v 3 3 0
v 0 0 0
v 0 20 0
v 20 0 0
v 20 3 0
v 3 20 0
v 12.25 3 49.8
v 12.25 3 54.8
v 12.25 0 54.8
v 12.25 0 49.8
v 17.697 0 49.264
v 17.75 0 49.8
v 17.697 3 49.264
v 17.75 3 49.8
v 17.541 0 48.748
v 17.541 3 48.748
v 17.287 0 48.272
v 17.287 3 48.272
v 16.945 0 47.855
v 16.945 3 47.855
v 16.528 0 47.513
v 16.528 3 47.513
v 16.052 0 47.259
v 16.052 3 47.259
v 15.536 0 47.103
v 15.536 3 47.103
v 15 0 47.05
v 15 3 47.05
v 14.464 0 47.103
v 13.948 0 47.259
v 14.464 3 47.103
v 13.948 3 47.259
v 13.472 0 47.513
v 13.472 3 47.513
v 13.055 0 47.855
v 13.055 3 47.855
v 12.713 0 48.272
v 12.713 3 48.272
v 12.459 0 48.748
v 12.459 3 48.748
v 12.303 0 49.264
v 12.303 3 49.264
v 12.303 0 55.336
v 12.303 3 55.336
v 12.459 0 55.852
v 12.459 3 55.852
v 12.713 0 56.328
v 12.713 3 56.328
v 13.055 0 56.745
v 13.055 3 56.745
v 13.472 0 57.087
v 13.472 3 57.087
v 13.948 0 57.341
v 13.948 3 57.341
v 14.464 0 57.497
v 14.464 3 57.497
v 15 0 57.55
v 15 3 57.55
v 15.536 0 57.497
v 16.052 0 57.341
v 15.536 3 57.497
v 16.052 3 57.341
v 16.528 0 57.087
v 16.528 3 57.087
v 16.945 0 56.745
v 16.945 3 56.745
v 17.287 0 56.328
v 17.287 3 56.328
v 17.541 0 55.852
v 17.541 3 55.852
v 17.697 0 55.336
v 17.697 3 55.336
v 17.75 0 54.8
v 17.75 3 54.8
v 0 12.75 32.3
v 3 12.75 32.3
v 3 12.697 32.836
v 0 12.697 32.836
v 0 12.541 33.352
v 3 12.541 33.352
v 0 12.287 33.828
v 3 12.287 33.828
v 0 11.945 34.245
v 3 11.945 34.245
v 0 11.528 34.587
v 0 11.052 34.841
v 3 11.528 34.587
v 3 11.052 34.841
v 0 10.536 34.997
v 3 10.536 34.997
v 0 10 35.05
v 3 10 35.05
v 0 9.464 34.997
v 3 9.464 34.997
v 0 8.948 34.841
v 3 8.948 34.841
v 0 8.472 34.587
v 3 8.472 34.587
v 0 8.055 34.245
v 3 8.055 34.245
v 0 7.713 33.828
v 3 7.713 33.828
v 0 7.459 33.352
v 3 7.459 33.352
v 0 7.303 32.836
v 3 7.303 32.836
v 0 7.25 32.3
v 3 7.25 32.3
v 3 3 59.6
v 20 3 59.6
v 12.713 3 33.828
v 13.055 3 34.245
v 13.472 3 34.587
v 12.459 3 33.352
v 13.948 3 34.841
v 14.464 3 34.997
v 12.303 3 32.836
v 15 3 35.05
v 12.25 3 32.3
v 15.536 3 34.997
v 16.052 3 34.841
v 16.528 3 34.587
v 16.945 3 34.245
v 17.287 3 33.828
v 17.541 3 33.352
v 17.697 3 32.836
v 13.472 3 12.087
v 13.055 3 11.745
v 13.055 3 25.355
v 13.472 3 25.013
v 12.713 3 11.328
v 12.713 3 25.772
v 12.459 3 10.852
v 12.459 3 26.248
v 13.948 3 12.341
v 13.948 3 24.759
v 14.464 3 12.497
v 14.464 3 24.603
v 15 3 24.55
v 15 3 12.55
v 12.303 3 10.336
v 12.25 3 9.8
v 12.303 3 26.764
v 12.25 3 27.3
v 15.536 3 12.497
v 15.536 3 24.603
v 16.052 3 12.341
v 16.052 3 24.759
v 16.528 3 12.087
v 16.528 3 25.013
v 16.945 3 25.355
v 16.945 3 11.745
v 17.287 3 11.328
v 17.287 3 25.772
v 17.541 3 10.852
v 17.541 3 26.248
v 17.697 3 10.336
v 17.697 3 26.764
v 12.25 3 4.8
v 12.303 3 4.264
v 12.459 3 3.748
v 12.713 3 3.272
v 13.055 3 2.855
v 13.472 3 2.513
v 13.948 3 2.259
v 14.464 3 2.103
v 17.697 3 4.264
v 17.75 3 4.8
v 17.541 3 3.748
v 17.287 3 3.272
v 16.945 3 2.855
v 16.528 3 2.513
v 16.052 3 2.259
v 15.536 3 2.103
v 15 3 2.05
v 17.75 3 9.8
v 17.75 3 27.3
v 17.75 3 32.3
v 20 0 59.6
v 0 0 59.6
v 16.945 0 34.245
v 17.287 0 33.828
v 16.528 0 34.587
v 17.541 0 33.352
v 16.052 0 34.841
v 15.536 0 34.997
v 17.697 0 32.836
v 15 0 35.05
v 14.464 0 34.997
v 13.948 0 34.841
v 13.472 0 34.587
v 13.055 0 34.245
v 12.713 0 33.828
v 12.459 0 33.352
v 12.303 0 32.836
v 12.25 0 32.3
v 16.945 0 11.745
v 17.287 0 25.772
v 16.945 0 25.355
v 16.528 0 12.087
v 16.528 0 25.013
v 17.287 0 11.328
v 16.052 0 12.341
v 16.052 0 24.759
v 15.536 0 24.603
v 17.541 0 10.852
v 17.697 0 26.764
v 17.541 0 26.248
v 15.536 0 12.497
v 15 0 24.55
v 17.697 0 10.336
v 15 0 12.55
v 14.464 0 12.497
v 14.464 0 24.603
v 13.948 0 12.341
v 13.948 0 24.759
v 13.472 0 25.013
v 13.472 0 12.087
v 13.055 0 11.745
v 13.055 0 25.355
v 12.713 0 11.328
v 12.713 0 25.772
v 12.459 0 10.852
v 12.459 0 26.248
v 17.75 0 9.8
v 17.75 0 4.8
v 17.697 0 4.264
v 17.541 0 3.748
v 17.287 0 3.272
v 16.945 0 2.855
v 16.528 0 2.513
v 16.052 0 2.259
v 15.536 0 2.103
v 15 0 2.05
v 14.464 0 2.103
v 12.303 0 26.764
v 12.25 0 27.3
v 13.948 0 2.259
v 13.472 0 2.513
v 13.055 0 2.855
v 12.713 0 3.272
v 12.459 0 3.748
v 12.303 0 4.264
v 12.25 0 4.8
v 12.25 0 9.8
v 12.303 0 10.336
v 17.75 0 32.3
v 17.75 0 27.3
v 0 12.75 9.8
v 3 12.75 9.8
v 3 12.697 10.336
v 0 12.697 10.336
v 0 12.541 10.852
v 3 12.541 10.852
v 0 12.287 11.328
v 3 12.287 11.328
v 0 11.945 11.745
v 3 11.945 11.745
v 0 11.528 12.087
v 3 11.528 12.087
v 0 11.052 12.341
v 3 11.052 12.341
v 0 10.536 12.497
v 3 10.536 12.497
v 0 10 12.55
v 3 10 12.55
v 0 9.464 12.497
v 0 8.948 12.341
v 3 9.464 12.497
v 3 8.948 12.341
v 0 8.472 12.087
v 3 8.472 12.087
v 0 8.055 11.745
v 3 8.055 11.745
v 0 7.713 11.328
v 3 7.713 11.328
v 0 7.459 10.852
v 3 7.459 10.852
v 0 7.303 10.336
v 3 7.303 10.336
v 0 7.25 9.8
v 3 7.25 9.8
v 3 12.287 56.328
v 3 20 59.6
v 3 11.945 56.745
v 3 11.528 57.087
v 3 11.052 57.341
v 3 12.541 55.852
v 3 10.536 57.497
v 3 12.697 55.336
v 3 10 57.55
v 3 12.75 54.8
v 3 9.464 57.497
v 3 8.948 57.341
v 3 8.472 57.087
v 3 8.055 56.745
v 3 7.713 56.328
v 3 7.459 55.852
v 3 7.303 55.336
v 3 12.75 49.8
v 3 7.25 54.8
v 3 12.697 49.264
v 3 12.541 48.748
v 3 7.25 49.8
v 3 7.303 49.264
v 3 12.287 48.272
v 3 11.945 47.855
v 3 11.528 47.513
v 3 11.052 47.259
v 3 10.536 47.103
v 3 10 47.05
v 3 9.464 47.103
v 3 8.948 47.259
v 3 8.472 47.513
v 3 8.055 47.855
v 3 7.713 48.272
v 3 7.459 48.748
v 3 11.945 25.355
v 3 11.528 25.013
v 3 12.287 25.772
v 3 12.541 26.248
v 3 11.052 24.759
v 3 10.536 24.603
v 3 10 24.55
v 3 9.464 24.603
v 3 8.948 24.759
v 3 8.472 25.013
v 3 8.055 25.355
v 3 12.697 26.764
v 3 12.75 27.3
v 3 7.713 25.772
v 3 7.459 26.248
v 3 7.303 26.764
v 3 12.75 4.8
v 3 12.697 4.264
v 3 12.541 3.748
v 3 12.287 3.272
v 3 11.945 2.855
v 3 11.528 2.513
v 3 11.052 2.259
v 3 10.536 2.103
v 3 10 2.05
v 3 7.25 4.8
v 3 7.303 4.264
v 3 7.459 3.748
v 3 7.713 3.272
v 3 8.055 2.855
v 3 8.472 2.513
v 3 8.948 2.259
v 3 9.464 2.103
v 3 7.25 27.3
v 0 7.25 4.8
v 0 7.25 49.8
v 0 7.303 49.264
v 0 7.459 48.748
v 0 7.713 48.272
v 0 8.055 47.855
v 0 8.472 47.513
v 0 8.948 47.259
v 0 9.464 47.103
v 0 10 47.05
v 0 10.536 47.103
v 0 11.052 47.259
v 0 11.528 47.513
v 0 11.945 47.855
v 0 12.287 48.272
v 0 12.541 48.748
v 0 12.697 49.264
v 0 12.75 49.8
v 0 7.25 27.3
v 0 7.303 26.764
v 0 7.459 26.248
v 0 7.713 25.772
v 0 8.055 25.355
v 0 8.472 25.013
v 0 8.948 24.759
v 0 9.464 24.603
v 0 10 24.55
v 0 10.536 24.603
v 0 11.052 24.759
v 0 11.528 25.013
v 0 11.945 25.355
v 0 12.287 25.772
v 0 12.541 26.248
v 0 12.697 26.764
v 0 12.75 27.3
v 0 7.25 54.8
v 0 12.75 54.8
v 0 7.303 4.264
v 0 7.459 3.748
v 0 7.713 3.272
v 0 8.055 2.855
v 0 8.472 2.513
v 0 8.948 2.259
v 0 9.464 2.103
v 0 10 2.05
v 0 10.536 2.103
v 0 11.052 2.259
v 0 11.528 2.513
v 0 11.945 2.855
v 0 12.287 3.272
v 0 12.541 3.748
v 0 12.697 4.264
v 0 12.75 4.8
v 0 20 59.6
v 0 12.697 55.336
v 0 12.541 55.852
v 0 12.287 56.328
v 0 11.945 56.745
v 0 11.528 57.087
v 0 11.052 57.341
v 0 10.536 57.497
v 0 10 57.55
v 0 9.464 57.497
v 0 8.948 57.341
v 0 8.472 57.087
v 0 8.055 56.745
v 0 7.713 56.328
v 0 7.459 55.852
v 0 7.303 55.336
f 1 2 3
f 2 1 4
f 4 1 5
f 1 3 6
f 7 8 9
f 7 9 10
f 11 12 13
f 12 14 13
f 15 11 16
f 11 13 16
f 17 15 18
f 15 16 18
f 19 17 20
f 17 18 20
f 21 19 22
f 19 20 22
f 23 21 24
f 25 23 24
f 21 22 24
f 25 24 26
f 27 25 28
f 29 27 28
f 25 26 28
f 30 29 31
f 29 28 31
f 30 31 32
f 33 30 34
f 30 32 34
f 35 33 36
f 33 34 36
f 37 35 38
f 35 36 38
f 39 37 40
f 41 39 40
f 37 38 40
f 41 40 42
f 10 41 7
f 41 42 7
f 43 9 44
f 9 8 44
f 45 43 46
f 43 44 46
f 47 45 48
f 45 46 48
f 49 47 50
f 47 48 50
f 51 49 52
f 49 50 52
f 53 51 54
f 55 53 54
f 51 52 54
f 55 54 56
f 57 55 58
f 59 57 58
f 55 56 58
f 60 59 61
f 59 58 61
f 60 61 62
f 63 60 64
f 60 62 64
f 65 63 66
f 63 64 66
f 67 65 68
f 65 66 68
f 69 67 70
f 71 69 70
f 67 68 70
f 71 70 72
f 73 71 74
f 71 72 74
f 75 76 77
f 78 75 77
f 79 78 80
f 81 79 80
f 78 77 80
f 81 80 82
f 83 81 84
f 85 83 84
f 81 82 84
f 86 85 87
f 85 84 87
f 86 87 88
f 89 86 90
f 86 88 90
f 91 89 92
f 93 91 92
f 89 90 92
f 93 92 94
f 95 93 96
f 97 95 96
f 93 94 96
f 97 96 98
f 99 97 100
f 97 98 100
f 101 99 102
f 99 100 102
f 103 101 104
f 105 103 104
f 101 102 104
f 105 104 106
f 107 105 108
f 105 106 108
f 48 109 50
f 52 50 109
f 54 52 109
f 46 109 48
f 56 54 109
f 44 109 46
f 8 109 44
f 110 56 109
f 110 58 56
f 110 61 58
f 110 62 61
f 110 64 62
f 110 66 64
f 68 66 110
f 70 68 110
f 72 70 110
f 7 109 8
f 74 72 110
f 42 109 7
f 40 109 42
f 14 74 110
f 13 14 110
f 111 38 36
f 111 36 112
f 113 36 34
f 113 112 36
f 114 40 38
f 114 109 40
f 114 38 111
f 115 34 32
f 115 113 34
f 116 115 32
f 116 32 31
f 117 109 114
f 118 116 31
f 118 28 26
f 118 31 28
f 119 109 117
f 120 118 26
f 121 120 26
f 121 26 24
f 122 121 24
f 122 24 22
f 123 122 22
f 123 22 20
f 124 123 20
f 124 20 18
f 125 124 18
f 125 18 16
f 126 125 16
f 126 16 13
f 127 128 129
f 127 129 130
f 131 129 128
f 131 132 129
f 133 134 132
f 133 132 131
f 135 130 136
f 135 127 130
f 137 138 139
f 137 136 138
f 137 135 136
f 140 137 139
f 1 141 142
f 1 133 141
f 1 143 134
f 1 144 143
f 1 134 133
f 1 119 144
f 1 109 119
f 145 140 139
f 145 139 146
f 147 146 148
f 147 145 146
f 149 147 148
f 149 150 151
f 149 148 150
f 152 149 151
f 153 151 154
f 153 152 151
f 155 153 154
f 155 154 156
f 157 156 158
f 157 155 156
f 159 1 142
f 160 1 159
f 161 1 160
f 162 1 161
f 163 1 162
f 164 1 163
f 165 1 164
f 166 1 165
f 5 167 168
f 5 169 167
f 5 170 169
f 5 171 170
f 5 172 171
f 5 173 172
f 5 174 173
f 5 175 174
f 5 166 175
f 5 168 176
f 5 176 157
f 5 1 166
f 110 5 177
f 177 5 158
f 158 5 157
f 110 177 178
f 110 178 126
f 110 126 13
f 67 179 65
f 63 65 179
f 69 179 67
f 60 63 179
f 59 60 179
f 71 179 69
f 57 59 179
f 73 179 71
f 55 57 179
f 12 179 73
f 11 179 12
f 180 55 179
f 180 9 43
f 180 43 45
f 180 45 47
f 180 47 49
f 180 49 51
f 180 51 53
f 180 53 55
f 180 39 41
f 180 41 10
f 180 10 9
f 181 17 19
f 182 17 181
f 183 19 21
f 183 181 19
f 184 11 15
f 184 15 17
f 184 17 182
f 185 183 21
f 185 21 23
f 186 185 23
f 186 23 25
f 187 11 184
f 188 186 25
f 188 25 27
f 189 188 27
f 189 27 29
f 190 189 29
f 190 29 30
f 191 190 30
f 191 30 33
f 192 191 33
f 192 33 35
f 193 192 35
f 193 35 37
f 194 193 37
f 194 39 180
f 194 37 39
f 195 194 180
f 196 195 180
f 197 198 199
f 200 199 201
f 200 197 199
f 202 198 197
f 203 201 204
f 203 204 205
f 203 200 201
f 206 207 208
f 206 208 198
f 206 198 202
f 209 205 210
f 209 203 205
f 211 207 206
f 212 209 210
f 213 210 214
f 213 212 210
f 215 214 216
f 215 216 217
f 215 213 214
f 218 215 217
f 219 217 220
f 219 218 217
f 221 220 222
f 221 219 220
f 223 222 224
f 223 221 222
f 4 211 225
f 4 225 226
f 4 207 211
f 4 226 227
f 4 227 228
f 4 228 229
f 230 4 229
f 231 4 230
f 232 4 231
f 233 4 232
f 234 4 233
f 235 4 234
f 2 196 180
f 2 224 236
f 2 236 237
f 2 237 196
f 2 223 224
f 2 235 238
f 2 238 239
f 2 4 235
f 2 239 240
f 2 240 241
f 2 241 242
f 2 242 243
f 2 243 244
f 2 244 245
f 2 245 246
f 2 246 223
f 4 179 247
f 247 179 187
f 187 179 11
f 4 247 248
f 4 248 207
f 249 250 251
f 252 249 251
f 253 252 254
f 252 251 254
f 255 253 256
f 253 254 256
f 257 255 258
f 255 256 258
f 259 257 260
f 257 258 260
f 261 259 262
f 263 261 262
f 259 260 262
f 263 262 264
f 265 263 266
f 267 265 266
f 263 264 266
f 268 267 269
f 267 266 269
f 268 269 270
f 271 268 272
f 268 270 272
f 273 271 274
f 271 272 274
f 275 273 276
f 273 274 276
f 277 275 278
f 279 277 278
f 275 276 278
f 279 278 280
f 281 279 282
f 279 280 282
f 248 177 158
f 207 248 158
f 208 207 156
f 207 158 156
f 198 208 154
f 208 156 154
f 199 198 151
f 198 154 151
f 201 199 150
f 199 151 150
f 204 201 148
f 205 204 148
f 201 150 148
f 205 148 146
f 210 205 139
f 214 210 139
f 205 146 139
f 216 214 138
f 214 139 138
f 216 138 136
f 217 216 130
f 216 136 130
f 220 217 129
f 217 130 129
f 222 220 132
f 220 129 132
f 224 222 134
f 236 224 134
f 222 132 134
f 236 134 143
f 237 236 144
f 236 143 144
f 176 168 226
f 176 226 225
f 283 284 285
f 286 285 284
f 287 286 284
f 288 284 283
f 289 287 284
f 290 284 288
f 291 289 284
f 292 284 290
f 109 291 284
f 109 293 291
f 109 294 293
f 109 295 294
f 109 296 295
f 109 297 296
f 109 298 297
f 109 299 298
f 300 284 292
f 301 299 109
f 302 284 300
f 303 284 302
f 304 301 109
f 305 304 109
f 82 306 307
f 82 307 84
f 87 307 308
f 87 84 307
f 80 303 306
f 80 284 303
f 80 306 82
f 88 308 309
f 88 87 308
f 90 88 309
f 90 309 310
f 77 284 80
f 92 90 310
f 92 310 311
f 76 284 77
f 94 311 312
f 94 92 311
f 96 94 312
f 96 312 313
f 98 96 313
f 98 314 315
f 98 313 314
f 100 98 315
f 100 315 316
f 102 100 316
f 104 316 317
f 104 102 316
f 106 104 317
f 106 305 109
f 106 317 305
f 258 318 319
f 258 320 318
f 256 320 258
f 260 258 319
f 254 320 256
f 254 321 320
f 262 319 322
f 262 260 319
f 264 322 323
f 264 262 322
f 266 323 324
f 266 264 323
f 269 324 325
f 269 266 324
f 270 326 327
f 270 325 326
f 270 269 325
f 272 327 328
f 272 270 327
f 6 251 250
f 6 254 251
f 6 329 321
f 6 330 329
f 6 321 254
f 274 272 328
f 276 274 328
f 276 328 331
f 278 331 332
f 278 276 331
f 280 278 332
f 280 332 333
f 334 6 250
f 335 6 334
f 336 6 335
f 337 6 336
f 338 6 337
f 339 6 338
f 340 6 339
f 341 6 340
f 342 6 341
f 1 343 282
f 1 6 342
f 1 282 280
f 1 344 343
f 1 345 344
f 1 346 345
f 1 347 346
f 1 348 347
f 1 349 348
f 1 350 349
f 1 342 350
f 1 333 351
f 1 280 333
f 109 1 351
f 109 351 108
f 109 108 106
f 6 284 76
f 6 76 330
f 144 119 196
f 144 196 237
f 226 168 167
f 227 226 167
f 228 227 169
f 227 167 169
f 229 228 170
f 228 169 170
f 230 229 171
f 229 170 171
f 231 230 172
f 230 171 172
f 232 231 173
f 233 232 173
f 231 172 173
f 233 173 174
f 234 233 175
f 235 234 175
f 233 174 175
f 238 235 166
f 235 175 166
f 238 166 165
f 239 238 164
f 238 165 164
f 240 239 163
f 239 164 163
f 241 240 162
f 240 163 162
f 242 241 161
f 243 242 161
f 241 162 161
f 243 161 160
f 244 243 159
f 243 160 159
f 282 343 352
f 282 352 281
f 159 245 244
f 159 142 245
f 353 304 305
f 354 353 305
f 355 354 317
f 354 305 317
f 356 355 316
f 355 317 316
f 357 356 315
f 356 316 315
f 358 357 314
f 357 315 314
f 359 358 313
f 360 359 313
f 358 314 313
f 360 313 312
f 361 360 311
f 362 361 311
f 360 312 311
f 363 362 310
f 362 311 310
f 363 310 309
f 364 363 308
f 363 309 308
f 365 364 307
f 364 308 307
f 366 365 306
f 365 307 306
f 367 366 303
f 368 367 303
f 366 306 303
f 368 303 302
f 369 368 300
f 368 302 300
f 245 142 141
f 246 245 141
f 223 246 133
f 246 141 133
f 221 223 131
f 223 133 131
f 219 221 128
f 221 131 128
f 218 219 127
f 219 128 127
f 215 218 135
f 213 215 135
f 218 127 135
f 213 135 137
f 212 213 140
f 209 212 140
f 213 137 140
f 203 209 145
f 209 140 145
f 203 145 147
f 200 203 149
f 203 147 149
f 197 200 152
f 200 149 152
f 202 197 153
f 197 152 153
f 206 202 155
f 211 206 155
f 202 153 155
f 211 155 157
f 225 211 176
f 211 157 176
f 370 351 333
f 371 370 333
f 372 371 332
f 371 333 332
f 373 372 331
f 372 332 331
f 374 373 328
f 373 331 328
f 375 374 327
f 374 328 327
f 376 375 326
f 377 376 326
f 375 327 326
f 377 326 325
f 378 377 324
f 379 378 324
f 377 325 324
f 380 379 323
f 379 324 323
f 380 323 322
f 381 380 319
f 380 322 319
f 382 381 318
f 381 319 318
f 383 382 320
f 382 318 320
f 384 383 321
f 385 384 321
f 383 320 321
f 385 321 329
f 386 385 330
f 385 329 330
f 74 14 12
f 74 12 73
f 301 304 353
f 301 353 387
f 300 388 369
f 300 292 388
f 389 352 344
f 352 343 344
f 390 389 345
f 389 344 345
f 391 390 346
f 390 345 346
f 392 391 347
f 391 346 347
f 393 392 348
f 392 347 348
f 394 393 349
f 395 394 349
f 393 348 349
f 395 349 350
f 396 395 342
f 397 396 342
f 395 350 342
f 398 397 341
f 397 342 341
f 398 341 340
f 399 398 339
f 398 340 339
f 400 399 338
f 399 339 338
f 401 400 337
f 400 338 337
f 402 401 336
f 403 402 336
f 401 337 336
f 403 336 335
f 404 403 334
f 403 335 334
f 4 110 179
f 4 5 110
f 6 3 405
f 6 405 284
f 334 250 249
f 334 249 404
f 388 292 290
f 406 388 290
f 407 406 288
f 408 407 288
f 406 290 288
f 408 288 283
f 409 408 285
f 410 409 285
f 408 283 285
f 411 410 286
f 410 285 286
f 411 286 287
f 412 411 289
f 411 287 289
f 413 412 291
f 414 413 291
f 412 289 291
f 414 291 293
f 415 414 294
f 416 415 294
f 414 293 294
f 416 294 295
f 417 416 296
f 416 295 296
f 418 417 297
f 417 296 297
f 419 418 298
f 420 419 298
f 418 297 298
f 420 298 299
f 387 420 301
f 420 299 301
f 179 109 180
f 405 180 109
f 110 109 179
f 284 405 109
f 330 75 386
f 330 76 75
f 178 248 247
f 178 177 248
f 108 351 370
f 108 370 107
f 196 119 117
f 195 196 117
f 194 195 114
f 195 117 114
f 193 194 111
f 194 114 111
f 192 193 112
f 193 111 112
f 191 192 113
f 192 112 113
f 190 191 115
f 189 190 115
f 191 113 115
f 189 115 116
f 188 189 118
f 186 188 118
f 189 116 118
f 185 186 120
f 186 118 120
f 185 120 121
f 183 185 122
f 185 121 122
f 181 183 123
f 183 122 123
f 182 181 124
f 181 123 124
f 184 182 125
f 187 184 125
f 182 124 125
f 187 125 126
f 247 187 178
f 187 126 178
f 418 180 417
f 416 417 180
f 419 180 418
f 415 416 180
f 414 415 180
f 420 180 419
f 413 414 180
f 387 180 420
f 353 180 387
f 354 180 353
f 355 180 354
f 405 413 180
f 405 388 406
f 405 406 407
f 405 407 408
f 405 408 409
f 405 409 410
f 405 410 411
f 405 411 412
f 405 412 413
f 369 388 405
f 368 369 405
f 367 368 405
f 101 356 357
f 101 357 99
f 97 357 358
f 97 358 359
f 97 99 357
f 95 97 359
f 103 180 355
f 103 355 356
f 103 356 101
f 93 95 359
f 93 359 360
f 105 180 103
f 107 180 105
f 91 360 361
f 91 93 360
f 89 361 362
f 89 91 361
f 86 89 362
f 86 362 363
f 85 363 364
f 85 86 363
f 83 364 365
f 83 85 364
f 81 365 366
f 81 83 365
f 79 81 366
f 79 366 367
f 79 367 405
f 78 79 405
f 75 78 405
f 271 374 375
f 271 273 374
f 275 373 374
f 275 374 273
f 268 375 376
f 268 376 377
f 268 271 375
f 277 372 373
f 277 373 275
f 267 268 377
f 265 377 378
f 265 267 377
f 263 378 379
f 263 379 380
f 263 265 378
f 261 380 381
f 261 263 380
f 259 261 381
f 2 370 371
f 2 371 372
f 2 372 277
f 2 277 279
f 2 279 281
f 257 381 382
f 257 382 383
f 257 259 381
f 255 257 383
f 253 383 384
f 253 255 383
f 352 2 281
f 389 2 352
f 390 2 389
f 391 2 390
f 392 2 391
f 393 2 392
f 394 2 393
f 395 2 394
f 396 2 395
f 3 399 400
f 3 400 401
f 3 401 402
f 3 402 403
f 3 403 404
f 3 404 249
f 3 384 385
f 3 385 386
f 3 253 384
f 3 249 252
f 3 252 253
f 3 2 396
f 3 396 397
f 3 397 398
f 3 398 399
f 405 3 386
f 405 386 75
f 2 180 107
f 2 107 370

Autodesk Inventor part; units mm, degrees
ref_plane "YZ Plane" through (0, 0, 0) normal (1, 0, 0) x (0, 1, 0)
ref_plane "XZ Plane" through (0, 0, 0) normal (0, 1, 0) x (-1, 0, 0)
ref_plane "XY Plane" through (0, 0, 0) normal (0, 0, 1) x (1, 0, 0)
sketch "Sketch1" plane through (0, 0, 0) normal (0, 0, 1) x (1, 0, 0)
  line L0 (0, 0) -> (0, 20)
  line L1 (0, 20) -> (3, 20)
  line L2 (3, 20) -> (3, 3)
  line L3 (3, 3) -> (20, 3)
  line L4 (20, 3) -> (20, 0)
  line L5 (20, 0) -> (0, 0)
  dimension "d0" = 20
  dimension "d1" = 3
  dimension "d2" = 17
  dimension "d3" = 17
extrude "Extrusion1" add sketch "Sketch1" along normal blind 59.6
sketch "Sketch2" plane through (3, 3, 0) normal (0, 1, 0) x (1, 0, 0)
  line L0 (0, 0) -> (17, 0) projected
  line L1 (17, -59.6) -> (0, -59.6) projected
  line L2 (17, 0) -> (17, -59.6) projected
  line L3 (12, -59.6) -> (12, 0) construction
  line L4 (12, -12.55) -> (12, -12.55)
  line L5 (9.25, -9.8) -> (9.25, -4.8)
  line L6 (12, -2.05) -> (12, -2.05)
  line L7 (14.75, -4.8) -> (14.75, -9.8)
  line L8 (14.75, -12.55) -> (9.25, -2.05) construction
  line L9 (9.25, -12.55) -> (14.75, -2.05) construction
  arc A0 (9.25, -9.8) -> (12, -12.55) centre (12, -9.8) ccw
  arc A1 (12, -12.55) -> (14.75, -9.8) centre (12, -9.8) ccw
  arc A2 (14.75, -4.8) -> (12, -2.05) centre (12, -4.8) ccw
  arc A3 (12, -2.05) -> (9.25, -4.8) centre (12, -4.8) ccw
  point P0 (-3, 0)
  point P1 (12, -7.3)
  dimension "bottom_row_offset" = 5
  dimension "d7" = 5.5
  dimension "hole_length" = 10.5
  dimension "bottom_hole_edge_offset" = 2.05
  dimension "d10" = 2.75
extrude "Extrusion2" cut sketch "Sketch2" against normal through all
sketch "Sketch3" plane through (3, 3, 0) normal (1, 0, 0) x (0, 0, -1)
  line L0 (0, 17) -> (0, 0) projected
  line L1 (0, 17) -> (-59.6, 17) projected
  line L2 (-59.6, 0) -> (-59.6, 17) projected
  line L3 (-59.6, 7) -> (0, 7) construction
  line L4 (-9.8, 9.75) -> (-4.8, 9.75)
  line L5 (-2.05, 7) -> (-2.05, 7)
  line L6 (-4.8, 4.25) -> (-9.8, 4.25)
  line L7 (-12.55, 7) -> (-12.55, 7)
  line L8 (-12.55, 9.75) -> (-2.05, 4.25) construction
  line L9 (-2.05, 9.75) -> (-12.55, 4.25) construction
  arc A0 (-9.8, 9.75) -> (-12.55, 7) centre (-9.8, 7) ccw
  arc A1 (-12.55, 7) -> (-9.8, 4.25) centre (-9.8, 7) ccw
  arc A2 (-4.8, 4.25) -> (-2.05, 7) centre (-4.8, 7) ccw
  arc A3 (-2.05, 7) -> (-4.8, 9.75) centre (-4.8, 7) ccw
  point P0 (0, -3)
  point P1 (-7.3, 7)
  dimension "top_row_offset" = 10
  dimension "d14" = 10.5
  dimension "d15" = 5.5
  dimension "d16" = 2.75
  dimension "d17" = 2.05
extrude "Extrusion3" cut sketch "Sketch3" against normal through all
pattern_linear "Rectangular Pattern1" count 3 spacing 22.5 along (0, 0, 1) of "Extrusion2", "Extrusion3"
equation "\"d14\" = hole_length"
equation "\"d17\" = bottom_hole_edge_offset"
equation "\"hole_number\" = 3"
properties part number "Universal L Bracket" material "Aluminum 6061"
